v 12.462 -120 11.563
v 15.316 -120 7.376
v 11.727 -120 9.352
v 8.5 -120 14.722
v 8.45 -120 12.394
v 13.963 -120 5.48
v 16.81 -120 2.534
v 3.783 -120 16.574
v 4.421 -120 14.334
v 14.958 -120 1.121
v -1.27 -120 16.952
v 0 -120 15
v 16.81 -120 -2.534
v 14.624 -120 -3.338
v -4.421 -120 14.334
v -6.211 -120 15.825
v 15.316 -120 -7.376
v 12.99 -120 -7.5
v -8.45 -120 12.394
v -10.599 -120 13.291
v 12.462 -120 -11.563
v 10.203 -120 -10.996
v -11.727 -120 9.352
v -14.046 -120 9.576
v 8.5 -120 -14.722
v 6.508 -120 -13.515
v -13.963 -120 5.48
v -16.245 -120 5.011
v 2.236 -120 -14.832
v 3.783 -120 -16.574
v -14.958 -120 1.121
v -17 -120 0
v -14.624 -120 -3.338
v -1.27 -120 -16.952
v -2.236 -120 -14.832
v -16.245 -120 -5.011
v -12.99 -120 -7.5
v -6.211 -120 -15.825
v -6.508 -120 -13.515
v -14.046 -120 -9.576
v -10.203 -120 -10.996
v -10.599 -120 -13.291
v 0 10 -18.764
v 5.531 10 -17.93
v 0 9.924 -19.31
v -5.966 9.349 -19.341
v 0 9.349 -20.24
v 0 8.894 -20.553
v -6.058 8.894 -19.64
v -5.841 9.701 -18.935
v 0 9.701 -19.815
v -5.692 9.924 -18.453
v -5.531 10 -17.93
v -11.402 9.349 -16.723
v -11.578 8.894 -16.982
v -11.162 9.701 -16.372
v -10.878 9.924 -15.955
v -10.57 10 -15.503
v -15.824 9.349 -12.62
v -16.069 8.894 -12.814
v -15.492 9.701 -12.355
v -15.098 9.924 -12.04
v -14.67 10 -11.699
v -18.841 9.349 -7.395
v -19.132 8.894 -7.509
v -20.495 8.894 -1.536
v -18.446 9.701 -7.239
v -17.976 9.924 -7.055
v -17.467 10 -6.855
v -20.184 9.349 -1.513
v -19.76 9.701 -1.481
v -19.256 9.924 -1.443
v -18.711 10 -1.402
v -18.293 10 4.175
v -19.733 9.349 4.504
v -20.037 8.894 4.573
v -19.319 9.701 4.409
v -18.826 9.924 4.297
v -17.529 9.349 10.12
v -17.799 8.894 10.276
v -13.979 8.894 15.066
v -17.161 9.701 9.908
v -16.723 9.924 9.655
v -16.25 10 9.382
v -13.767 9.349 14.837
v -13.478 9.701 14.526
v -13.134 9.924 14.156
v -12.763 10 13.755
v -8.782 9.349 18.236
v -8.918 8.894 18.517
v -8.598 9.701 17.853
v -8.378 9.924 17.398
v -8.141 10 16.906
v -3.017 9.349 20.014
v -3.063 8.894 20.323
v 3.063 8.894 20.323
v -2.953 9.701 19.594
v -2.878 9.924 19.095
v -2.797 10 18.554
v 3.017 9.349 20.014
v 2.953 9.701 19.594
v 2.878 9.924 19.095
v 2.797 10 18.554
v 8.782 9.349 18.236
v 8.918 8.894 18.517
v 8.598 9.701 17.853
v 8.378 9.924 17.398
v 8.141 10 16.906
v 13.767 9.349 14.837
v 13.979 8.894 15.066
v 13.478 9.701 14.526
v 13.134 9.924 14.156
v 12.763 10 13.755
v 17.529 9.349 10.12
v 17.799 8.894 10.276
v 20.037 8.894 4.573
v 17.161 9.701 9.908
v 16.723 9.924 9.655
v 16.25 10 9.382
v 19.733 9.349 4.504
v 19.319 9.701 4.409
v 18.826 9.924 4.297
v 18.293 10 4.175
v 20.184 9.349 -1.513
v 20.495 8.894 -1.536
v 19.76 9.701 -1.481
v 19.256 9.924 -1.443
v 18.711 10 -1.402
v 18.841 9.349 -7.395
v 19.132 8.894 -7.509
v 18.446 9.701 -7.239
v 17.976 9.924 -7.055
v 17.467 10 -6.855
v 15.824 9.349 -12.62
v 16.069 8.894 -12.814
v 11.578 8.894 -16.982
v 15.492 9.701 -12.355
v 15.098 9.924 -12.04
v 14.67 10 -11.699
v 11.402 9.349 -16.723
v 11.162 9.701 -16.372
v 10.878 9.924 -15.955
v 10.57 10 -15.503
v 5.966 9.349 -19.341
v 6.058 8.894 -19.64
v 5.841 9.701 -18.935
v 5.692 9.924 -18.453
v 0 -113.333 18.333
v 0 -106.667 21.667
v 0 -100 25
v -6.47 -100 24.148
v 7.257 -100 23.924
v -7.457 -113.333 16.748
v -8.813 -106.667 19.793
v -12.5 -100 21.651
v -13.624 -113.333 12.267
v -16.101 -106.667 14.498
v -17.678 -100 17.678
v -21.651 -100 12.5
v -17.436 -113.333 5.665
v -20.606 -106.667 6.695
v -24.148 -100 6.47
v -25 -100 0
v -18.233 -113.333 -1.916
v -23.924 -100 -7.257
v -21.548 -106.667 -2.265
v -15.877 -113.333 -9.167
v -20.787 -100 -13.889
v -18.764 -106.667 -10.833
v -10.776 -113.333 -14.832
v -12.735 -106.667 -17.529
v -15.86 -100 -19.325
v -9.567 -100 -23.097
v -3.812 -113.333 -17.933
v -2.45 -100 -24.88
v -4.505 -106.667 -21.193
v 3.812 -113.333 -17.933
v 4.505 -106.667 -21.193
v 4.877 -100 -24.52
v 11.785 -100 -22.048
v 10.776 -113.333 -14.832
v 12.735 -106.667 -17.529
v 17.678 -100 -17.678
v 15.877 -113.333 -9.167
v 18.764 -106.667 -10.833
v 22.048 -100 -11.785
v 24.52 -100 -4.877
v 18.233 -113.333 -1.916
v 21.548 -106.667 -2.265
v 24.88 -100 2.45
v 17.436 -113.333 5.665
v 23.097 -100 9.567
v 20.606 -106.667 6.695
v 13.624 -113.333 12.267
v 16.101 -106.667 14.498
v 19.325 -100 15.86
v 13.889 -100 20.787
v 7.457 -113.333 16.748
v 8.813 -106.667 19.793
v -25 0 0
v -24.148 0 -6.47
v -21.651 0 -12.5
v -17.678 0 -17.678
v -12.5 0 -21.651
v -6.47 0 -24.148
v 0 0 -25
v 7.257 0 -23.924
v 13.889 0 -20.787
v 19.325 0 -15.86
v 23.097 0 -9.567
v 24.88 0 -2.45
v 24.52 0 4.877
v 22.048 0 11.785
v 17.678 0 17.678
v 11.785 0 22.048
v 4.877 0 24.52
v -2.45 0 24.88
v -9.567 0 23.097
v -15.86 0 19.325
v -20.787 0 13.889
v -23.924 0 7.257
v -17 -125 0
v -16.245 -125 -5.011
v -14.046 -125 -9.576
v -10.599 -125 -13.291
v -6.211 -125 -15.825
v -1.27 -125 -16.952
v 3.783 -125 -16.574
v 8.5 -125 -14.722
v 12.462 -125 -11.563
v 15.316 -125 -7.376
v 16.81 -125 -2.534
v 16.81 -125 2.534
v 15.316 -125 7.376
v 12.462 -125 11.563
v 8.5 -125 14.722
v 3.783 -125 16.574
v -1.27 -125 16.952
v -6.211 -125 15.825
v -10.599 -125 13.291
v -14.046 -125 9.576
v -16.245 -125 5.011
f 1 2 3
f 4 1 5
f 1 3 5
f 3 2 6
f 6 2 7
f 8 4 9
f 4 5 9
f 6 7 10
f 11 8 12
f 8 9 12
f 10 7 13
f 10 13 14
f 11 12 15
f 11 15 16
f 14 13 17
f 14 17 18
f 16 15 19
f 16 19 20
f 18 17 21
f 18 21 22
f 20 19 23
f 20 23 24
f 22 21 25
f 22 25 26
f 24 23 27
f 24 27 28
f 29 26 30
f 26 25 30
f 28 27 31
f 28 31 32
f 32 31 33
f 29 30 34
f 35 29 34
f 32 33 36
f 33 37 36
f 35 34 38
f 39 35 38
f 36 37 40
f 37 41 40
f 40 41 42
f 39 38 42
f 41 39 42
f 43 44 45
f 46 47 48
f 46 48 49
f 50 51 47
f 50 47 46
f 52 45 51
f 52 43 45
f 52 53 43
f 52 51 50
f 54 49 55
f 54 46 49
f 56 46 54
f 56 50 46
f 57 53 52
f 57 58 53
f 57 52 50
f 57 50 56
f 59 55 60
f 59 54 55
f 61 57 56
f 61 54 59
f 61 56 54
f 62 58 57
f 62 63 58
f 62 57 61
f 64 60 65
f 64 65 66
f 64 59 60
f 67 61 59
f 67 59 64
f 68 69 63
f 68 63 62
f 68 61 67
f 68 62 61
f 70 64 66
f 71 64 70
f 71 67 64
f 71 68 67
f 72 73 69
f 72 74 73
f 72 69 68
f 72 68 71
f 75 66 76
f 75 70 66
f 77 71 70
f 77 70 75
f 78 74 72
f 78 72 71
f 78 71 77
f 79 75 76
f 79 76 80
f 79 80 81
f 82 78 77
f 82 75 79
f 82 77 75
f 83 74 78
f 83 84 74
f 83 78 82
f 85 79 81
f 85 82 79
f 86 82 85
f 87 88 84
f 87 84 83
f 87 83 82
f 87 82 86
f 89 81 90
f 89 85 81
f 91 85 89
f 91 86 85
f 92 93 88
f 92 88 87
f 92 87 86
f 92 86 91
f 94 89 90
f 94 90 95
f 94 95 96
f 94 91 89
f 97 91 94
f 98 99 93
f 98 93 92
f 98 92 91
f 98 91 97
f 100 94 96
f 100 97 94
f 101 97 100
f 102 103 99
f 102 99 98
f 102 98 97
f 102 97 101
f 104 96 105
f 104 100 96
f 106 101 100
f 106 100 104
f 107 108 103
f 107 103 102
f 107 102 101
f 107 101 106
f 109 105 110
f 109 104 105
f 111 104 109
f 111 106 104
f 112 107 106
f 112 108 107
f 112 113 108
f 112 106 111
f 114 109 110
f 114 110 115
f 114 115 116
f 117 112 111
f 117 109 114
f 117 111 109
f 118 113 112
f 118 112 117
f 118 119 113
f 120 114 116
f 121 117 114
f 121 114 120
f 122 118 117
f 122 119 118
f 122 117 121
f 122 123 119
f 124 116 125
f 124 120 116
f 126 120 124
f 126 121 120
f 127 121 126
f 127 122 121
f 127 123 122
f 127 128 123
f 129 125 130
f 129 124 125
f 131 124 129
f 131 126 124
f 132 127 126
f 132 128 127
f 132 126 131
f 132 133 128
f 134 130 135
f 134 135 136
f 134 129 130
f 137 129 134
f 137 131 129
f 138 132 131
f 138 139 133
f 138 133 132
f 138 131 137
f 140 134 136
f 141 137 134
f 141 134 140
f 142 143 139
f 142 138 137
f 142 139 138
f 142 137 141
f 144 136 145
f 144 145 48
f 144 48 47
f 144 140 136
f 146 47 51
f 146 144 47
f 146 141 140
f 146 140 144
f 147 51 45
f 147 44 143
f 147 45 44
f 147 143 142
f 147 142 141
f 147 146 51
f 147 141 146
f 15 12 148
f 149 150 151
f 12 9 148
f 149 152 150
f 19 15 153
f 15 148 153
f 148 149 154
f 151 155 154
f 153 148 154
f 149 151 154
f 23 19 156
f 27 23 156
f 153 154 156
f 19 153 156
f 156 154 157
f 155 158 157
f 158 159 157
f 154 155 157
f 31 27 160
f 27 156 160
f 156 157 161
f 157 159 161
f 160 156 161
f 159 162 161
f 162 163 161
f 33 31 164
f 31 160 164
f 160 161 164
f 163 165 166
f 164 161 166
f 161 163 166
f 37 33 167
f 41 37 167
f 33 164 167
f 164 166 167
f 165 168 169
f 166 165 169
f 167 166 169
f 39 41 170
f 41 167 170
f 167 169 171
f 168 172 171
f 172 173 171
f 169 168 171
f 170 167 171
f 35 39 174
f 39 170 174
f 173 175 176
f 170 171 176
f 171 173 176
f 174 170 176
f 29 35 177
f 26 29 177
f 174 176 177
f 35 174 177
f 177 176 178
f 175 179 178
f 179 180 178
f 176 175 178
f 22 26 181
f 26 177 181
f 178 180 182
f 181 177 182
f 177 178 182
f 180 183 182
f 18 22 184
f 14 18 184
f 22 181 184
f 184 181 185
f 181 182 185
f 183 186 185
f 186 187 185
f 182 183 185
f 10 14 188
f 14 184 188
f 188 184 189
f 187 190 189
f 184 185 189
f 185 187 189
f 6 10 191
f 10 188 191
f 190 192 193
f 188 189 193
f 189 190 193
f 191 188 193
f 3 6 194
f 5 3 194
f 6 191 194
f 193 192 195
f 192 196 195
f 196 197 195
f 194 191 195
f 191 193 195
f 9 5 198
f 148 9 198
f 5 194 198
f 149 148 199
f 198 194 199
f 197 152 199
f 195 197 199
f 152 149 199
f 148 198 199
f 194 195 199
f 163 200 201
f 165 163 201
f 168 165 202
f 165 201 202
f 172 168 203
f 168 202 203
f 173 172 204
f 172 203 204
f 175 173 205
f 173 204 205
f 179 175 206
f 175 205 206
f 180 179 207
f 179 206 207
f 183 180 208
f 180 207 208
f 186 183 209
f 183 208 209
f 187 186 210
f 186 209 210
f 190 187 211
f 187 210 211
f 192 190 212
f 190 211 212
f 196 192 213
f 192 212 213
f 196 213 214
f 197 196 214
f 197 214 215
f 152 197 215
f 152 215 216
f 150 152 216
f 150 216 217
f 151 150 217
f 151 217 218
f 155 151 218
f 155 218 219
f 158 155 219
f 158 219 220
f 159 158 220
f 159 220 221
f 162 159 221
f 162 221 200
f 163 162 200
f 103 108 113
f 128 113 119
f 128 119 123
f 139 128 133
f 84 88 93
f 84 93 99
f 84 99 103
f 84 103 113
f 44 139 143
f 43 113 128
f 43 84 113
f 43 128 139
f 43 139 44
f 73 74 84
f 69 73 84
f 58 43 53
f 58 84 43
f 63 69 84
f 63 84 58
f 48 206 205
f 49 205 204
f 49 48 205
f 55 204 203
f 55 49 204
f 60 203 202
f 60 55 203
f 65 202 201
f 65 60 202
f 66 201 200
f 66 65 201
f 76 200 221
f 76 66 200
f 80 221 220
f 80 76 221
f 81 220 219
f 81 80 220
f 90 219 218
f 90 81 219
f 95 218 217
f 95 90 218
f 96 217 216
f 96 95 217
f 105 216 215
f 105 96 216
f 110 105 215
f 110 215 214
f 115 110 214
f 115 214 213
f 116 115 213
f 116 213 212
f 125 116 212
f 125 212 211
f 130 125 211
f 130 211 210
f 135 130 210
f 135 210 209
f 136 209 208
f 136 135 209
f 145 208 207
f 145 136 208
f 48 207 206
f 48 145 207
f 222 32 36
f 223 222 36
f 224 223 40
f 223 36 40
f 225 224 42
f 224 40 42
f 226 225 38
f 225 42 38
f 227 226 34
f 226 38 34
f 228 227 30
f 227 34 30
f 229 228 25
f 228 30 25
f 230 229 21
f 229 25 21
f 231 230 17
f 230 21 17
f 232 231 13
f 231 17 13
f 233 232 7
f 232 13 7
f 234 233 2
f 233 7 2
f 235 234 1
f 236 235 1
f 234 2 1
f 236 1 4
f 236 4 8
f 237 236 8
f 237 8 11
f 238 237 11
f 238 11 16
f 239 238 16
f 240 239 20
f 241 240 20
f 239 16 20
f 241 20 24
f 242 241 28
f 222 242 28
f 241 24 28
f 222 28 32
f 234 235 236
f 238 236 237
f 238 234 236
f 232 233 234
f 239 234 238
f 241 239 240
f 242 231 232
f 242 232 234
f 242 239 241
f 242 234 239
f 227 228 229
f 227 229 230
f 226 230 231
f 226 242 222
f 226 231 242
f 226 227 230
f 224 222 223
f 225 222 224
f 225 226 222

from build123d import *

# Parameters (mm, degrees)
SKETCH_3_R      = 25
EXTRUDE_2_DEPTH = 100
SKETCH_6_R      = 17
EXTRUDE_3_DEPTH = 5
FILLET_1_R      = 2


with BuildPart() as part:
    # 草图2 → 旋转1 (revolve)
    with BuildSketch(Plane(origin=(0, 0, 0), x_dir=(0, 0, -1), z_dir=(1, 0, 0))):
        Polygon((0, 0), (25, 0), (20, 10), (0, 10), align=None)
    revolve(axis=Axis((0, 0, 0), (0, 1, 0)))

    # 草图3 → 凸台-拉伸2 (add)
    with BuildSketch(Plane(origin=(0, 0, 0), x_dir=(-1, 0, 0), z_dir=(0, -1, 0))):
        Circle(SKETCH_3_R)
    extrude(amount=EXTRUDE_2_DEPTH)

    # 草图5 → 旋转2 (revolve)
    with BuildSketch(Plane(origin=(0, 0, 0), x_dir=(0, 0, -1), z_dir=(1, 0, 0))):
        Polygon((-25, -100), (0, -100), (0, -120), (-15, -120), align=None)
    revolve(axis=Axis((0, -100, 0), (0, -1, 0)))

    # 草图6 → 凸台-拉伸3 (add)
    with BuildSketch(Plane(origin=(0, -120, 0), x_dir=(-1, 0, 0), z_dir=(0, -1, 0))):
        Circle(SKETCH_6_R)
    extrude(amount=EXTRUDE_3_DEPTH)

    # 圆角1
    fillet_1_edges = [part.edges().sort_by_distance(p)[0] for p in [
        (0, 10, 20),
    ]]
    fillet(fillet_1_edges, radius=FILLET_1_R)


solid = part.part
